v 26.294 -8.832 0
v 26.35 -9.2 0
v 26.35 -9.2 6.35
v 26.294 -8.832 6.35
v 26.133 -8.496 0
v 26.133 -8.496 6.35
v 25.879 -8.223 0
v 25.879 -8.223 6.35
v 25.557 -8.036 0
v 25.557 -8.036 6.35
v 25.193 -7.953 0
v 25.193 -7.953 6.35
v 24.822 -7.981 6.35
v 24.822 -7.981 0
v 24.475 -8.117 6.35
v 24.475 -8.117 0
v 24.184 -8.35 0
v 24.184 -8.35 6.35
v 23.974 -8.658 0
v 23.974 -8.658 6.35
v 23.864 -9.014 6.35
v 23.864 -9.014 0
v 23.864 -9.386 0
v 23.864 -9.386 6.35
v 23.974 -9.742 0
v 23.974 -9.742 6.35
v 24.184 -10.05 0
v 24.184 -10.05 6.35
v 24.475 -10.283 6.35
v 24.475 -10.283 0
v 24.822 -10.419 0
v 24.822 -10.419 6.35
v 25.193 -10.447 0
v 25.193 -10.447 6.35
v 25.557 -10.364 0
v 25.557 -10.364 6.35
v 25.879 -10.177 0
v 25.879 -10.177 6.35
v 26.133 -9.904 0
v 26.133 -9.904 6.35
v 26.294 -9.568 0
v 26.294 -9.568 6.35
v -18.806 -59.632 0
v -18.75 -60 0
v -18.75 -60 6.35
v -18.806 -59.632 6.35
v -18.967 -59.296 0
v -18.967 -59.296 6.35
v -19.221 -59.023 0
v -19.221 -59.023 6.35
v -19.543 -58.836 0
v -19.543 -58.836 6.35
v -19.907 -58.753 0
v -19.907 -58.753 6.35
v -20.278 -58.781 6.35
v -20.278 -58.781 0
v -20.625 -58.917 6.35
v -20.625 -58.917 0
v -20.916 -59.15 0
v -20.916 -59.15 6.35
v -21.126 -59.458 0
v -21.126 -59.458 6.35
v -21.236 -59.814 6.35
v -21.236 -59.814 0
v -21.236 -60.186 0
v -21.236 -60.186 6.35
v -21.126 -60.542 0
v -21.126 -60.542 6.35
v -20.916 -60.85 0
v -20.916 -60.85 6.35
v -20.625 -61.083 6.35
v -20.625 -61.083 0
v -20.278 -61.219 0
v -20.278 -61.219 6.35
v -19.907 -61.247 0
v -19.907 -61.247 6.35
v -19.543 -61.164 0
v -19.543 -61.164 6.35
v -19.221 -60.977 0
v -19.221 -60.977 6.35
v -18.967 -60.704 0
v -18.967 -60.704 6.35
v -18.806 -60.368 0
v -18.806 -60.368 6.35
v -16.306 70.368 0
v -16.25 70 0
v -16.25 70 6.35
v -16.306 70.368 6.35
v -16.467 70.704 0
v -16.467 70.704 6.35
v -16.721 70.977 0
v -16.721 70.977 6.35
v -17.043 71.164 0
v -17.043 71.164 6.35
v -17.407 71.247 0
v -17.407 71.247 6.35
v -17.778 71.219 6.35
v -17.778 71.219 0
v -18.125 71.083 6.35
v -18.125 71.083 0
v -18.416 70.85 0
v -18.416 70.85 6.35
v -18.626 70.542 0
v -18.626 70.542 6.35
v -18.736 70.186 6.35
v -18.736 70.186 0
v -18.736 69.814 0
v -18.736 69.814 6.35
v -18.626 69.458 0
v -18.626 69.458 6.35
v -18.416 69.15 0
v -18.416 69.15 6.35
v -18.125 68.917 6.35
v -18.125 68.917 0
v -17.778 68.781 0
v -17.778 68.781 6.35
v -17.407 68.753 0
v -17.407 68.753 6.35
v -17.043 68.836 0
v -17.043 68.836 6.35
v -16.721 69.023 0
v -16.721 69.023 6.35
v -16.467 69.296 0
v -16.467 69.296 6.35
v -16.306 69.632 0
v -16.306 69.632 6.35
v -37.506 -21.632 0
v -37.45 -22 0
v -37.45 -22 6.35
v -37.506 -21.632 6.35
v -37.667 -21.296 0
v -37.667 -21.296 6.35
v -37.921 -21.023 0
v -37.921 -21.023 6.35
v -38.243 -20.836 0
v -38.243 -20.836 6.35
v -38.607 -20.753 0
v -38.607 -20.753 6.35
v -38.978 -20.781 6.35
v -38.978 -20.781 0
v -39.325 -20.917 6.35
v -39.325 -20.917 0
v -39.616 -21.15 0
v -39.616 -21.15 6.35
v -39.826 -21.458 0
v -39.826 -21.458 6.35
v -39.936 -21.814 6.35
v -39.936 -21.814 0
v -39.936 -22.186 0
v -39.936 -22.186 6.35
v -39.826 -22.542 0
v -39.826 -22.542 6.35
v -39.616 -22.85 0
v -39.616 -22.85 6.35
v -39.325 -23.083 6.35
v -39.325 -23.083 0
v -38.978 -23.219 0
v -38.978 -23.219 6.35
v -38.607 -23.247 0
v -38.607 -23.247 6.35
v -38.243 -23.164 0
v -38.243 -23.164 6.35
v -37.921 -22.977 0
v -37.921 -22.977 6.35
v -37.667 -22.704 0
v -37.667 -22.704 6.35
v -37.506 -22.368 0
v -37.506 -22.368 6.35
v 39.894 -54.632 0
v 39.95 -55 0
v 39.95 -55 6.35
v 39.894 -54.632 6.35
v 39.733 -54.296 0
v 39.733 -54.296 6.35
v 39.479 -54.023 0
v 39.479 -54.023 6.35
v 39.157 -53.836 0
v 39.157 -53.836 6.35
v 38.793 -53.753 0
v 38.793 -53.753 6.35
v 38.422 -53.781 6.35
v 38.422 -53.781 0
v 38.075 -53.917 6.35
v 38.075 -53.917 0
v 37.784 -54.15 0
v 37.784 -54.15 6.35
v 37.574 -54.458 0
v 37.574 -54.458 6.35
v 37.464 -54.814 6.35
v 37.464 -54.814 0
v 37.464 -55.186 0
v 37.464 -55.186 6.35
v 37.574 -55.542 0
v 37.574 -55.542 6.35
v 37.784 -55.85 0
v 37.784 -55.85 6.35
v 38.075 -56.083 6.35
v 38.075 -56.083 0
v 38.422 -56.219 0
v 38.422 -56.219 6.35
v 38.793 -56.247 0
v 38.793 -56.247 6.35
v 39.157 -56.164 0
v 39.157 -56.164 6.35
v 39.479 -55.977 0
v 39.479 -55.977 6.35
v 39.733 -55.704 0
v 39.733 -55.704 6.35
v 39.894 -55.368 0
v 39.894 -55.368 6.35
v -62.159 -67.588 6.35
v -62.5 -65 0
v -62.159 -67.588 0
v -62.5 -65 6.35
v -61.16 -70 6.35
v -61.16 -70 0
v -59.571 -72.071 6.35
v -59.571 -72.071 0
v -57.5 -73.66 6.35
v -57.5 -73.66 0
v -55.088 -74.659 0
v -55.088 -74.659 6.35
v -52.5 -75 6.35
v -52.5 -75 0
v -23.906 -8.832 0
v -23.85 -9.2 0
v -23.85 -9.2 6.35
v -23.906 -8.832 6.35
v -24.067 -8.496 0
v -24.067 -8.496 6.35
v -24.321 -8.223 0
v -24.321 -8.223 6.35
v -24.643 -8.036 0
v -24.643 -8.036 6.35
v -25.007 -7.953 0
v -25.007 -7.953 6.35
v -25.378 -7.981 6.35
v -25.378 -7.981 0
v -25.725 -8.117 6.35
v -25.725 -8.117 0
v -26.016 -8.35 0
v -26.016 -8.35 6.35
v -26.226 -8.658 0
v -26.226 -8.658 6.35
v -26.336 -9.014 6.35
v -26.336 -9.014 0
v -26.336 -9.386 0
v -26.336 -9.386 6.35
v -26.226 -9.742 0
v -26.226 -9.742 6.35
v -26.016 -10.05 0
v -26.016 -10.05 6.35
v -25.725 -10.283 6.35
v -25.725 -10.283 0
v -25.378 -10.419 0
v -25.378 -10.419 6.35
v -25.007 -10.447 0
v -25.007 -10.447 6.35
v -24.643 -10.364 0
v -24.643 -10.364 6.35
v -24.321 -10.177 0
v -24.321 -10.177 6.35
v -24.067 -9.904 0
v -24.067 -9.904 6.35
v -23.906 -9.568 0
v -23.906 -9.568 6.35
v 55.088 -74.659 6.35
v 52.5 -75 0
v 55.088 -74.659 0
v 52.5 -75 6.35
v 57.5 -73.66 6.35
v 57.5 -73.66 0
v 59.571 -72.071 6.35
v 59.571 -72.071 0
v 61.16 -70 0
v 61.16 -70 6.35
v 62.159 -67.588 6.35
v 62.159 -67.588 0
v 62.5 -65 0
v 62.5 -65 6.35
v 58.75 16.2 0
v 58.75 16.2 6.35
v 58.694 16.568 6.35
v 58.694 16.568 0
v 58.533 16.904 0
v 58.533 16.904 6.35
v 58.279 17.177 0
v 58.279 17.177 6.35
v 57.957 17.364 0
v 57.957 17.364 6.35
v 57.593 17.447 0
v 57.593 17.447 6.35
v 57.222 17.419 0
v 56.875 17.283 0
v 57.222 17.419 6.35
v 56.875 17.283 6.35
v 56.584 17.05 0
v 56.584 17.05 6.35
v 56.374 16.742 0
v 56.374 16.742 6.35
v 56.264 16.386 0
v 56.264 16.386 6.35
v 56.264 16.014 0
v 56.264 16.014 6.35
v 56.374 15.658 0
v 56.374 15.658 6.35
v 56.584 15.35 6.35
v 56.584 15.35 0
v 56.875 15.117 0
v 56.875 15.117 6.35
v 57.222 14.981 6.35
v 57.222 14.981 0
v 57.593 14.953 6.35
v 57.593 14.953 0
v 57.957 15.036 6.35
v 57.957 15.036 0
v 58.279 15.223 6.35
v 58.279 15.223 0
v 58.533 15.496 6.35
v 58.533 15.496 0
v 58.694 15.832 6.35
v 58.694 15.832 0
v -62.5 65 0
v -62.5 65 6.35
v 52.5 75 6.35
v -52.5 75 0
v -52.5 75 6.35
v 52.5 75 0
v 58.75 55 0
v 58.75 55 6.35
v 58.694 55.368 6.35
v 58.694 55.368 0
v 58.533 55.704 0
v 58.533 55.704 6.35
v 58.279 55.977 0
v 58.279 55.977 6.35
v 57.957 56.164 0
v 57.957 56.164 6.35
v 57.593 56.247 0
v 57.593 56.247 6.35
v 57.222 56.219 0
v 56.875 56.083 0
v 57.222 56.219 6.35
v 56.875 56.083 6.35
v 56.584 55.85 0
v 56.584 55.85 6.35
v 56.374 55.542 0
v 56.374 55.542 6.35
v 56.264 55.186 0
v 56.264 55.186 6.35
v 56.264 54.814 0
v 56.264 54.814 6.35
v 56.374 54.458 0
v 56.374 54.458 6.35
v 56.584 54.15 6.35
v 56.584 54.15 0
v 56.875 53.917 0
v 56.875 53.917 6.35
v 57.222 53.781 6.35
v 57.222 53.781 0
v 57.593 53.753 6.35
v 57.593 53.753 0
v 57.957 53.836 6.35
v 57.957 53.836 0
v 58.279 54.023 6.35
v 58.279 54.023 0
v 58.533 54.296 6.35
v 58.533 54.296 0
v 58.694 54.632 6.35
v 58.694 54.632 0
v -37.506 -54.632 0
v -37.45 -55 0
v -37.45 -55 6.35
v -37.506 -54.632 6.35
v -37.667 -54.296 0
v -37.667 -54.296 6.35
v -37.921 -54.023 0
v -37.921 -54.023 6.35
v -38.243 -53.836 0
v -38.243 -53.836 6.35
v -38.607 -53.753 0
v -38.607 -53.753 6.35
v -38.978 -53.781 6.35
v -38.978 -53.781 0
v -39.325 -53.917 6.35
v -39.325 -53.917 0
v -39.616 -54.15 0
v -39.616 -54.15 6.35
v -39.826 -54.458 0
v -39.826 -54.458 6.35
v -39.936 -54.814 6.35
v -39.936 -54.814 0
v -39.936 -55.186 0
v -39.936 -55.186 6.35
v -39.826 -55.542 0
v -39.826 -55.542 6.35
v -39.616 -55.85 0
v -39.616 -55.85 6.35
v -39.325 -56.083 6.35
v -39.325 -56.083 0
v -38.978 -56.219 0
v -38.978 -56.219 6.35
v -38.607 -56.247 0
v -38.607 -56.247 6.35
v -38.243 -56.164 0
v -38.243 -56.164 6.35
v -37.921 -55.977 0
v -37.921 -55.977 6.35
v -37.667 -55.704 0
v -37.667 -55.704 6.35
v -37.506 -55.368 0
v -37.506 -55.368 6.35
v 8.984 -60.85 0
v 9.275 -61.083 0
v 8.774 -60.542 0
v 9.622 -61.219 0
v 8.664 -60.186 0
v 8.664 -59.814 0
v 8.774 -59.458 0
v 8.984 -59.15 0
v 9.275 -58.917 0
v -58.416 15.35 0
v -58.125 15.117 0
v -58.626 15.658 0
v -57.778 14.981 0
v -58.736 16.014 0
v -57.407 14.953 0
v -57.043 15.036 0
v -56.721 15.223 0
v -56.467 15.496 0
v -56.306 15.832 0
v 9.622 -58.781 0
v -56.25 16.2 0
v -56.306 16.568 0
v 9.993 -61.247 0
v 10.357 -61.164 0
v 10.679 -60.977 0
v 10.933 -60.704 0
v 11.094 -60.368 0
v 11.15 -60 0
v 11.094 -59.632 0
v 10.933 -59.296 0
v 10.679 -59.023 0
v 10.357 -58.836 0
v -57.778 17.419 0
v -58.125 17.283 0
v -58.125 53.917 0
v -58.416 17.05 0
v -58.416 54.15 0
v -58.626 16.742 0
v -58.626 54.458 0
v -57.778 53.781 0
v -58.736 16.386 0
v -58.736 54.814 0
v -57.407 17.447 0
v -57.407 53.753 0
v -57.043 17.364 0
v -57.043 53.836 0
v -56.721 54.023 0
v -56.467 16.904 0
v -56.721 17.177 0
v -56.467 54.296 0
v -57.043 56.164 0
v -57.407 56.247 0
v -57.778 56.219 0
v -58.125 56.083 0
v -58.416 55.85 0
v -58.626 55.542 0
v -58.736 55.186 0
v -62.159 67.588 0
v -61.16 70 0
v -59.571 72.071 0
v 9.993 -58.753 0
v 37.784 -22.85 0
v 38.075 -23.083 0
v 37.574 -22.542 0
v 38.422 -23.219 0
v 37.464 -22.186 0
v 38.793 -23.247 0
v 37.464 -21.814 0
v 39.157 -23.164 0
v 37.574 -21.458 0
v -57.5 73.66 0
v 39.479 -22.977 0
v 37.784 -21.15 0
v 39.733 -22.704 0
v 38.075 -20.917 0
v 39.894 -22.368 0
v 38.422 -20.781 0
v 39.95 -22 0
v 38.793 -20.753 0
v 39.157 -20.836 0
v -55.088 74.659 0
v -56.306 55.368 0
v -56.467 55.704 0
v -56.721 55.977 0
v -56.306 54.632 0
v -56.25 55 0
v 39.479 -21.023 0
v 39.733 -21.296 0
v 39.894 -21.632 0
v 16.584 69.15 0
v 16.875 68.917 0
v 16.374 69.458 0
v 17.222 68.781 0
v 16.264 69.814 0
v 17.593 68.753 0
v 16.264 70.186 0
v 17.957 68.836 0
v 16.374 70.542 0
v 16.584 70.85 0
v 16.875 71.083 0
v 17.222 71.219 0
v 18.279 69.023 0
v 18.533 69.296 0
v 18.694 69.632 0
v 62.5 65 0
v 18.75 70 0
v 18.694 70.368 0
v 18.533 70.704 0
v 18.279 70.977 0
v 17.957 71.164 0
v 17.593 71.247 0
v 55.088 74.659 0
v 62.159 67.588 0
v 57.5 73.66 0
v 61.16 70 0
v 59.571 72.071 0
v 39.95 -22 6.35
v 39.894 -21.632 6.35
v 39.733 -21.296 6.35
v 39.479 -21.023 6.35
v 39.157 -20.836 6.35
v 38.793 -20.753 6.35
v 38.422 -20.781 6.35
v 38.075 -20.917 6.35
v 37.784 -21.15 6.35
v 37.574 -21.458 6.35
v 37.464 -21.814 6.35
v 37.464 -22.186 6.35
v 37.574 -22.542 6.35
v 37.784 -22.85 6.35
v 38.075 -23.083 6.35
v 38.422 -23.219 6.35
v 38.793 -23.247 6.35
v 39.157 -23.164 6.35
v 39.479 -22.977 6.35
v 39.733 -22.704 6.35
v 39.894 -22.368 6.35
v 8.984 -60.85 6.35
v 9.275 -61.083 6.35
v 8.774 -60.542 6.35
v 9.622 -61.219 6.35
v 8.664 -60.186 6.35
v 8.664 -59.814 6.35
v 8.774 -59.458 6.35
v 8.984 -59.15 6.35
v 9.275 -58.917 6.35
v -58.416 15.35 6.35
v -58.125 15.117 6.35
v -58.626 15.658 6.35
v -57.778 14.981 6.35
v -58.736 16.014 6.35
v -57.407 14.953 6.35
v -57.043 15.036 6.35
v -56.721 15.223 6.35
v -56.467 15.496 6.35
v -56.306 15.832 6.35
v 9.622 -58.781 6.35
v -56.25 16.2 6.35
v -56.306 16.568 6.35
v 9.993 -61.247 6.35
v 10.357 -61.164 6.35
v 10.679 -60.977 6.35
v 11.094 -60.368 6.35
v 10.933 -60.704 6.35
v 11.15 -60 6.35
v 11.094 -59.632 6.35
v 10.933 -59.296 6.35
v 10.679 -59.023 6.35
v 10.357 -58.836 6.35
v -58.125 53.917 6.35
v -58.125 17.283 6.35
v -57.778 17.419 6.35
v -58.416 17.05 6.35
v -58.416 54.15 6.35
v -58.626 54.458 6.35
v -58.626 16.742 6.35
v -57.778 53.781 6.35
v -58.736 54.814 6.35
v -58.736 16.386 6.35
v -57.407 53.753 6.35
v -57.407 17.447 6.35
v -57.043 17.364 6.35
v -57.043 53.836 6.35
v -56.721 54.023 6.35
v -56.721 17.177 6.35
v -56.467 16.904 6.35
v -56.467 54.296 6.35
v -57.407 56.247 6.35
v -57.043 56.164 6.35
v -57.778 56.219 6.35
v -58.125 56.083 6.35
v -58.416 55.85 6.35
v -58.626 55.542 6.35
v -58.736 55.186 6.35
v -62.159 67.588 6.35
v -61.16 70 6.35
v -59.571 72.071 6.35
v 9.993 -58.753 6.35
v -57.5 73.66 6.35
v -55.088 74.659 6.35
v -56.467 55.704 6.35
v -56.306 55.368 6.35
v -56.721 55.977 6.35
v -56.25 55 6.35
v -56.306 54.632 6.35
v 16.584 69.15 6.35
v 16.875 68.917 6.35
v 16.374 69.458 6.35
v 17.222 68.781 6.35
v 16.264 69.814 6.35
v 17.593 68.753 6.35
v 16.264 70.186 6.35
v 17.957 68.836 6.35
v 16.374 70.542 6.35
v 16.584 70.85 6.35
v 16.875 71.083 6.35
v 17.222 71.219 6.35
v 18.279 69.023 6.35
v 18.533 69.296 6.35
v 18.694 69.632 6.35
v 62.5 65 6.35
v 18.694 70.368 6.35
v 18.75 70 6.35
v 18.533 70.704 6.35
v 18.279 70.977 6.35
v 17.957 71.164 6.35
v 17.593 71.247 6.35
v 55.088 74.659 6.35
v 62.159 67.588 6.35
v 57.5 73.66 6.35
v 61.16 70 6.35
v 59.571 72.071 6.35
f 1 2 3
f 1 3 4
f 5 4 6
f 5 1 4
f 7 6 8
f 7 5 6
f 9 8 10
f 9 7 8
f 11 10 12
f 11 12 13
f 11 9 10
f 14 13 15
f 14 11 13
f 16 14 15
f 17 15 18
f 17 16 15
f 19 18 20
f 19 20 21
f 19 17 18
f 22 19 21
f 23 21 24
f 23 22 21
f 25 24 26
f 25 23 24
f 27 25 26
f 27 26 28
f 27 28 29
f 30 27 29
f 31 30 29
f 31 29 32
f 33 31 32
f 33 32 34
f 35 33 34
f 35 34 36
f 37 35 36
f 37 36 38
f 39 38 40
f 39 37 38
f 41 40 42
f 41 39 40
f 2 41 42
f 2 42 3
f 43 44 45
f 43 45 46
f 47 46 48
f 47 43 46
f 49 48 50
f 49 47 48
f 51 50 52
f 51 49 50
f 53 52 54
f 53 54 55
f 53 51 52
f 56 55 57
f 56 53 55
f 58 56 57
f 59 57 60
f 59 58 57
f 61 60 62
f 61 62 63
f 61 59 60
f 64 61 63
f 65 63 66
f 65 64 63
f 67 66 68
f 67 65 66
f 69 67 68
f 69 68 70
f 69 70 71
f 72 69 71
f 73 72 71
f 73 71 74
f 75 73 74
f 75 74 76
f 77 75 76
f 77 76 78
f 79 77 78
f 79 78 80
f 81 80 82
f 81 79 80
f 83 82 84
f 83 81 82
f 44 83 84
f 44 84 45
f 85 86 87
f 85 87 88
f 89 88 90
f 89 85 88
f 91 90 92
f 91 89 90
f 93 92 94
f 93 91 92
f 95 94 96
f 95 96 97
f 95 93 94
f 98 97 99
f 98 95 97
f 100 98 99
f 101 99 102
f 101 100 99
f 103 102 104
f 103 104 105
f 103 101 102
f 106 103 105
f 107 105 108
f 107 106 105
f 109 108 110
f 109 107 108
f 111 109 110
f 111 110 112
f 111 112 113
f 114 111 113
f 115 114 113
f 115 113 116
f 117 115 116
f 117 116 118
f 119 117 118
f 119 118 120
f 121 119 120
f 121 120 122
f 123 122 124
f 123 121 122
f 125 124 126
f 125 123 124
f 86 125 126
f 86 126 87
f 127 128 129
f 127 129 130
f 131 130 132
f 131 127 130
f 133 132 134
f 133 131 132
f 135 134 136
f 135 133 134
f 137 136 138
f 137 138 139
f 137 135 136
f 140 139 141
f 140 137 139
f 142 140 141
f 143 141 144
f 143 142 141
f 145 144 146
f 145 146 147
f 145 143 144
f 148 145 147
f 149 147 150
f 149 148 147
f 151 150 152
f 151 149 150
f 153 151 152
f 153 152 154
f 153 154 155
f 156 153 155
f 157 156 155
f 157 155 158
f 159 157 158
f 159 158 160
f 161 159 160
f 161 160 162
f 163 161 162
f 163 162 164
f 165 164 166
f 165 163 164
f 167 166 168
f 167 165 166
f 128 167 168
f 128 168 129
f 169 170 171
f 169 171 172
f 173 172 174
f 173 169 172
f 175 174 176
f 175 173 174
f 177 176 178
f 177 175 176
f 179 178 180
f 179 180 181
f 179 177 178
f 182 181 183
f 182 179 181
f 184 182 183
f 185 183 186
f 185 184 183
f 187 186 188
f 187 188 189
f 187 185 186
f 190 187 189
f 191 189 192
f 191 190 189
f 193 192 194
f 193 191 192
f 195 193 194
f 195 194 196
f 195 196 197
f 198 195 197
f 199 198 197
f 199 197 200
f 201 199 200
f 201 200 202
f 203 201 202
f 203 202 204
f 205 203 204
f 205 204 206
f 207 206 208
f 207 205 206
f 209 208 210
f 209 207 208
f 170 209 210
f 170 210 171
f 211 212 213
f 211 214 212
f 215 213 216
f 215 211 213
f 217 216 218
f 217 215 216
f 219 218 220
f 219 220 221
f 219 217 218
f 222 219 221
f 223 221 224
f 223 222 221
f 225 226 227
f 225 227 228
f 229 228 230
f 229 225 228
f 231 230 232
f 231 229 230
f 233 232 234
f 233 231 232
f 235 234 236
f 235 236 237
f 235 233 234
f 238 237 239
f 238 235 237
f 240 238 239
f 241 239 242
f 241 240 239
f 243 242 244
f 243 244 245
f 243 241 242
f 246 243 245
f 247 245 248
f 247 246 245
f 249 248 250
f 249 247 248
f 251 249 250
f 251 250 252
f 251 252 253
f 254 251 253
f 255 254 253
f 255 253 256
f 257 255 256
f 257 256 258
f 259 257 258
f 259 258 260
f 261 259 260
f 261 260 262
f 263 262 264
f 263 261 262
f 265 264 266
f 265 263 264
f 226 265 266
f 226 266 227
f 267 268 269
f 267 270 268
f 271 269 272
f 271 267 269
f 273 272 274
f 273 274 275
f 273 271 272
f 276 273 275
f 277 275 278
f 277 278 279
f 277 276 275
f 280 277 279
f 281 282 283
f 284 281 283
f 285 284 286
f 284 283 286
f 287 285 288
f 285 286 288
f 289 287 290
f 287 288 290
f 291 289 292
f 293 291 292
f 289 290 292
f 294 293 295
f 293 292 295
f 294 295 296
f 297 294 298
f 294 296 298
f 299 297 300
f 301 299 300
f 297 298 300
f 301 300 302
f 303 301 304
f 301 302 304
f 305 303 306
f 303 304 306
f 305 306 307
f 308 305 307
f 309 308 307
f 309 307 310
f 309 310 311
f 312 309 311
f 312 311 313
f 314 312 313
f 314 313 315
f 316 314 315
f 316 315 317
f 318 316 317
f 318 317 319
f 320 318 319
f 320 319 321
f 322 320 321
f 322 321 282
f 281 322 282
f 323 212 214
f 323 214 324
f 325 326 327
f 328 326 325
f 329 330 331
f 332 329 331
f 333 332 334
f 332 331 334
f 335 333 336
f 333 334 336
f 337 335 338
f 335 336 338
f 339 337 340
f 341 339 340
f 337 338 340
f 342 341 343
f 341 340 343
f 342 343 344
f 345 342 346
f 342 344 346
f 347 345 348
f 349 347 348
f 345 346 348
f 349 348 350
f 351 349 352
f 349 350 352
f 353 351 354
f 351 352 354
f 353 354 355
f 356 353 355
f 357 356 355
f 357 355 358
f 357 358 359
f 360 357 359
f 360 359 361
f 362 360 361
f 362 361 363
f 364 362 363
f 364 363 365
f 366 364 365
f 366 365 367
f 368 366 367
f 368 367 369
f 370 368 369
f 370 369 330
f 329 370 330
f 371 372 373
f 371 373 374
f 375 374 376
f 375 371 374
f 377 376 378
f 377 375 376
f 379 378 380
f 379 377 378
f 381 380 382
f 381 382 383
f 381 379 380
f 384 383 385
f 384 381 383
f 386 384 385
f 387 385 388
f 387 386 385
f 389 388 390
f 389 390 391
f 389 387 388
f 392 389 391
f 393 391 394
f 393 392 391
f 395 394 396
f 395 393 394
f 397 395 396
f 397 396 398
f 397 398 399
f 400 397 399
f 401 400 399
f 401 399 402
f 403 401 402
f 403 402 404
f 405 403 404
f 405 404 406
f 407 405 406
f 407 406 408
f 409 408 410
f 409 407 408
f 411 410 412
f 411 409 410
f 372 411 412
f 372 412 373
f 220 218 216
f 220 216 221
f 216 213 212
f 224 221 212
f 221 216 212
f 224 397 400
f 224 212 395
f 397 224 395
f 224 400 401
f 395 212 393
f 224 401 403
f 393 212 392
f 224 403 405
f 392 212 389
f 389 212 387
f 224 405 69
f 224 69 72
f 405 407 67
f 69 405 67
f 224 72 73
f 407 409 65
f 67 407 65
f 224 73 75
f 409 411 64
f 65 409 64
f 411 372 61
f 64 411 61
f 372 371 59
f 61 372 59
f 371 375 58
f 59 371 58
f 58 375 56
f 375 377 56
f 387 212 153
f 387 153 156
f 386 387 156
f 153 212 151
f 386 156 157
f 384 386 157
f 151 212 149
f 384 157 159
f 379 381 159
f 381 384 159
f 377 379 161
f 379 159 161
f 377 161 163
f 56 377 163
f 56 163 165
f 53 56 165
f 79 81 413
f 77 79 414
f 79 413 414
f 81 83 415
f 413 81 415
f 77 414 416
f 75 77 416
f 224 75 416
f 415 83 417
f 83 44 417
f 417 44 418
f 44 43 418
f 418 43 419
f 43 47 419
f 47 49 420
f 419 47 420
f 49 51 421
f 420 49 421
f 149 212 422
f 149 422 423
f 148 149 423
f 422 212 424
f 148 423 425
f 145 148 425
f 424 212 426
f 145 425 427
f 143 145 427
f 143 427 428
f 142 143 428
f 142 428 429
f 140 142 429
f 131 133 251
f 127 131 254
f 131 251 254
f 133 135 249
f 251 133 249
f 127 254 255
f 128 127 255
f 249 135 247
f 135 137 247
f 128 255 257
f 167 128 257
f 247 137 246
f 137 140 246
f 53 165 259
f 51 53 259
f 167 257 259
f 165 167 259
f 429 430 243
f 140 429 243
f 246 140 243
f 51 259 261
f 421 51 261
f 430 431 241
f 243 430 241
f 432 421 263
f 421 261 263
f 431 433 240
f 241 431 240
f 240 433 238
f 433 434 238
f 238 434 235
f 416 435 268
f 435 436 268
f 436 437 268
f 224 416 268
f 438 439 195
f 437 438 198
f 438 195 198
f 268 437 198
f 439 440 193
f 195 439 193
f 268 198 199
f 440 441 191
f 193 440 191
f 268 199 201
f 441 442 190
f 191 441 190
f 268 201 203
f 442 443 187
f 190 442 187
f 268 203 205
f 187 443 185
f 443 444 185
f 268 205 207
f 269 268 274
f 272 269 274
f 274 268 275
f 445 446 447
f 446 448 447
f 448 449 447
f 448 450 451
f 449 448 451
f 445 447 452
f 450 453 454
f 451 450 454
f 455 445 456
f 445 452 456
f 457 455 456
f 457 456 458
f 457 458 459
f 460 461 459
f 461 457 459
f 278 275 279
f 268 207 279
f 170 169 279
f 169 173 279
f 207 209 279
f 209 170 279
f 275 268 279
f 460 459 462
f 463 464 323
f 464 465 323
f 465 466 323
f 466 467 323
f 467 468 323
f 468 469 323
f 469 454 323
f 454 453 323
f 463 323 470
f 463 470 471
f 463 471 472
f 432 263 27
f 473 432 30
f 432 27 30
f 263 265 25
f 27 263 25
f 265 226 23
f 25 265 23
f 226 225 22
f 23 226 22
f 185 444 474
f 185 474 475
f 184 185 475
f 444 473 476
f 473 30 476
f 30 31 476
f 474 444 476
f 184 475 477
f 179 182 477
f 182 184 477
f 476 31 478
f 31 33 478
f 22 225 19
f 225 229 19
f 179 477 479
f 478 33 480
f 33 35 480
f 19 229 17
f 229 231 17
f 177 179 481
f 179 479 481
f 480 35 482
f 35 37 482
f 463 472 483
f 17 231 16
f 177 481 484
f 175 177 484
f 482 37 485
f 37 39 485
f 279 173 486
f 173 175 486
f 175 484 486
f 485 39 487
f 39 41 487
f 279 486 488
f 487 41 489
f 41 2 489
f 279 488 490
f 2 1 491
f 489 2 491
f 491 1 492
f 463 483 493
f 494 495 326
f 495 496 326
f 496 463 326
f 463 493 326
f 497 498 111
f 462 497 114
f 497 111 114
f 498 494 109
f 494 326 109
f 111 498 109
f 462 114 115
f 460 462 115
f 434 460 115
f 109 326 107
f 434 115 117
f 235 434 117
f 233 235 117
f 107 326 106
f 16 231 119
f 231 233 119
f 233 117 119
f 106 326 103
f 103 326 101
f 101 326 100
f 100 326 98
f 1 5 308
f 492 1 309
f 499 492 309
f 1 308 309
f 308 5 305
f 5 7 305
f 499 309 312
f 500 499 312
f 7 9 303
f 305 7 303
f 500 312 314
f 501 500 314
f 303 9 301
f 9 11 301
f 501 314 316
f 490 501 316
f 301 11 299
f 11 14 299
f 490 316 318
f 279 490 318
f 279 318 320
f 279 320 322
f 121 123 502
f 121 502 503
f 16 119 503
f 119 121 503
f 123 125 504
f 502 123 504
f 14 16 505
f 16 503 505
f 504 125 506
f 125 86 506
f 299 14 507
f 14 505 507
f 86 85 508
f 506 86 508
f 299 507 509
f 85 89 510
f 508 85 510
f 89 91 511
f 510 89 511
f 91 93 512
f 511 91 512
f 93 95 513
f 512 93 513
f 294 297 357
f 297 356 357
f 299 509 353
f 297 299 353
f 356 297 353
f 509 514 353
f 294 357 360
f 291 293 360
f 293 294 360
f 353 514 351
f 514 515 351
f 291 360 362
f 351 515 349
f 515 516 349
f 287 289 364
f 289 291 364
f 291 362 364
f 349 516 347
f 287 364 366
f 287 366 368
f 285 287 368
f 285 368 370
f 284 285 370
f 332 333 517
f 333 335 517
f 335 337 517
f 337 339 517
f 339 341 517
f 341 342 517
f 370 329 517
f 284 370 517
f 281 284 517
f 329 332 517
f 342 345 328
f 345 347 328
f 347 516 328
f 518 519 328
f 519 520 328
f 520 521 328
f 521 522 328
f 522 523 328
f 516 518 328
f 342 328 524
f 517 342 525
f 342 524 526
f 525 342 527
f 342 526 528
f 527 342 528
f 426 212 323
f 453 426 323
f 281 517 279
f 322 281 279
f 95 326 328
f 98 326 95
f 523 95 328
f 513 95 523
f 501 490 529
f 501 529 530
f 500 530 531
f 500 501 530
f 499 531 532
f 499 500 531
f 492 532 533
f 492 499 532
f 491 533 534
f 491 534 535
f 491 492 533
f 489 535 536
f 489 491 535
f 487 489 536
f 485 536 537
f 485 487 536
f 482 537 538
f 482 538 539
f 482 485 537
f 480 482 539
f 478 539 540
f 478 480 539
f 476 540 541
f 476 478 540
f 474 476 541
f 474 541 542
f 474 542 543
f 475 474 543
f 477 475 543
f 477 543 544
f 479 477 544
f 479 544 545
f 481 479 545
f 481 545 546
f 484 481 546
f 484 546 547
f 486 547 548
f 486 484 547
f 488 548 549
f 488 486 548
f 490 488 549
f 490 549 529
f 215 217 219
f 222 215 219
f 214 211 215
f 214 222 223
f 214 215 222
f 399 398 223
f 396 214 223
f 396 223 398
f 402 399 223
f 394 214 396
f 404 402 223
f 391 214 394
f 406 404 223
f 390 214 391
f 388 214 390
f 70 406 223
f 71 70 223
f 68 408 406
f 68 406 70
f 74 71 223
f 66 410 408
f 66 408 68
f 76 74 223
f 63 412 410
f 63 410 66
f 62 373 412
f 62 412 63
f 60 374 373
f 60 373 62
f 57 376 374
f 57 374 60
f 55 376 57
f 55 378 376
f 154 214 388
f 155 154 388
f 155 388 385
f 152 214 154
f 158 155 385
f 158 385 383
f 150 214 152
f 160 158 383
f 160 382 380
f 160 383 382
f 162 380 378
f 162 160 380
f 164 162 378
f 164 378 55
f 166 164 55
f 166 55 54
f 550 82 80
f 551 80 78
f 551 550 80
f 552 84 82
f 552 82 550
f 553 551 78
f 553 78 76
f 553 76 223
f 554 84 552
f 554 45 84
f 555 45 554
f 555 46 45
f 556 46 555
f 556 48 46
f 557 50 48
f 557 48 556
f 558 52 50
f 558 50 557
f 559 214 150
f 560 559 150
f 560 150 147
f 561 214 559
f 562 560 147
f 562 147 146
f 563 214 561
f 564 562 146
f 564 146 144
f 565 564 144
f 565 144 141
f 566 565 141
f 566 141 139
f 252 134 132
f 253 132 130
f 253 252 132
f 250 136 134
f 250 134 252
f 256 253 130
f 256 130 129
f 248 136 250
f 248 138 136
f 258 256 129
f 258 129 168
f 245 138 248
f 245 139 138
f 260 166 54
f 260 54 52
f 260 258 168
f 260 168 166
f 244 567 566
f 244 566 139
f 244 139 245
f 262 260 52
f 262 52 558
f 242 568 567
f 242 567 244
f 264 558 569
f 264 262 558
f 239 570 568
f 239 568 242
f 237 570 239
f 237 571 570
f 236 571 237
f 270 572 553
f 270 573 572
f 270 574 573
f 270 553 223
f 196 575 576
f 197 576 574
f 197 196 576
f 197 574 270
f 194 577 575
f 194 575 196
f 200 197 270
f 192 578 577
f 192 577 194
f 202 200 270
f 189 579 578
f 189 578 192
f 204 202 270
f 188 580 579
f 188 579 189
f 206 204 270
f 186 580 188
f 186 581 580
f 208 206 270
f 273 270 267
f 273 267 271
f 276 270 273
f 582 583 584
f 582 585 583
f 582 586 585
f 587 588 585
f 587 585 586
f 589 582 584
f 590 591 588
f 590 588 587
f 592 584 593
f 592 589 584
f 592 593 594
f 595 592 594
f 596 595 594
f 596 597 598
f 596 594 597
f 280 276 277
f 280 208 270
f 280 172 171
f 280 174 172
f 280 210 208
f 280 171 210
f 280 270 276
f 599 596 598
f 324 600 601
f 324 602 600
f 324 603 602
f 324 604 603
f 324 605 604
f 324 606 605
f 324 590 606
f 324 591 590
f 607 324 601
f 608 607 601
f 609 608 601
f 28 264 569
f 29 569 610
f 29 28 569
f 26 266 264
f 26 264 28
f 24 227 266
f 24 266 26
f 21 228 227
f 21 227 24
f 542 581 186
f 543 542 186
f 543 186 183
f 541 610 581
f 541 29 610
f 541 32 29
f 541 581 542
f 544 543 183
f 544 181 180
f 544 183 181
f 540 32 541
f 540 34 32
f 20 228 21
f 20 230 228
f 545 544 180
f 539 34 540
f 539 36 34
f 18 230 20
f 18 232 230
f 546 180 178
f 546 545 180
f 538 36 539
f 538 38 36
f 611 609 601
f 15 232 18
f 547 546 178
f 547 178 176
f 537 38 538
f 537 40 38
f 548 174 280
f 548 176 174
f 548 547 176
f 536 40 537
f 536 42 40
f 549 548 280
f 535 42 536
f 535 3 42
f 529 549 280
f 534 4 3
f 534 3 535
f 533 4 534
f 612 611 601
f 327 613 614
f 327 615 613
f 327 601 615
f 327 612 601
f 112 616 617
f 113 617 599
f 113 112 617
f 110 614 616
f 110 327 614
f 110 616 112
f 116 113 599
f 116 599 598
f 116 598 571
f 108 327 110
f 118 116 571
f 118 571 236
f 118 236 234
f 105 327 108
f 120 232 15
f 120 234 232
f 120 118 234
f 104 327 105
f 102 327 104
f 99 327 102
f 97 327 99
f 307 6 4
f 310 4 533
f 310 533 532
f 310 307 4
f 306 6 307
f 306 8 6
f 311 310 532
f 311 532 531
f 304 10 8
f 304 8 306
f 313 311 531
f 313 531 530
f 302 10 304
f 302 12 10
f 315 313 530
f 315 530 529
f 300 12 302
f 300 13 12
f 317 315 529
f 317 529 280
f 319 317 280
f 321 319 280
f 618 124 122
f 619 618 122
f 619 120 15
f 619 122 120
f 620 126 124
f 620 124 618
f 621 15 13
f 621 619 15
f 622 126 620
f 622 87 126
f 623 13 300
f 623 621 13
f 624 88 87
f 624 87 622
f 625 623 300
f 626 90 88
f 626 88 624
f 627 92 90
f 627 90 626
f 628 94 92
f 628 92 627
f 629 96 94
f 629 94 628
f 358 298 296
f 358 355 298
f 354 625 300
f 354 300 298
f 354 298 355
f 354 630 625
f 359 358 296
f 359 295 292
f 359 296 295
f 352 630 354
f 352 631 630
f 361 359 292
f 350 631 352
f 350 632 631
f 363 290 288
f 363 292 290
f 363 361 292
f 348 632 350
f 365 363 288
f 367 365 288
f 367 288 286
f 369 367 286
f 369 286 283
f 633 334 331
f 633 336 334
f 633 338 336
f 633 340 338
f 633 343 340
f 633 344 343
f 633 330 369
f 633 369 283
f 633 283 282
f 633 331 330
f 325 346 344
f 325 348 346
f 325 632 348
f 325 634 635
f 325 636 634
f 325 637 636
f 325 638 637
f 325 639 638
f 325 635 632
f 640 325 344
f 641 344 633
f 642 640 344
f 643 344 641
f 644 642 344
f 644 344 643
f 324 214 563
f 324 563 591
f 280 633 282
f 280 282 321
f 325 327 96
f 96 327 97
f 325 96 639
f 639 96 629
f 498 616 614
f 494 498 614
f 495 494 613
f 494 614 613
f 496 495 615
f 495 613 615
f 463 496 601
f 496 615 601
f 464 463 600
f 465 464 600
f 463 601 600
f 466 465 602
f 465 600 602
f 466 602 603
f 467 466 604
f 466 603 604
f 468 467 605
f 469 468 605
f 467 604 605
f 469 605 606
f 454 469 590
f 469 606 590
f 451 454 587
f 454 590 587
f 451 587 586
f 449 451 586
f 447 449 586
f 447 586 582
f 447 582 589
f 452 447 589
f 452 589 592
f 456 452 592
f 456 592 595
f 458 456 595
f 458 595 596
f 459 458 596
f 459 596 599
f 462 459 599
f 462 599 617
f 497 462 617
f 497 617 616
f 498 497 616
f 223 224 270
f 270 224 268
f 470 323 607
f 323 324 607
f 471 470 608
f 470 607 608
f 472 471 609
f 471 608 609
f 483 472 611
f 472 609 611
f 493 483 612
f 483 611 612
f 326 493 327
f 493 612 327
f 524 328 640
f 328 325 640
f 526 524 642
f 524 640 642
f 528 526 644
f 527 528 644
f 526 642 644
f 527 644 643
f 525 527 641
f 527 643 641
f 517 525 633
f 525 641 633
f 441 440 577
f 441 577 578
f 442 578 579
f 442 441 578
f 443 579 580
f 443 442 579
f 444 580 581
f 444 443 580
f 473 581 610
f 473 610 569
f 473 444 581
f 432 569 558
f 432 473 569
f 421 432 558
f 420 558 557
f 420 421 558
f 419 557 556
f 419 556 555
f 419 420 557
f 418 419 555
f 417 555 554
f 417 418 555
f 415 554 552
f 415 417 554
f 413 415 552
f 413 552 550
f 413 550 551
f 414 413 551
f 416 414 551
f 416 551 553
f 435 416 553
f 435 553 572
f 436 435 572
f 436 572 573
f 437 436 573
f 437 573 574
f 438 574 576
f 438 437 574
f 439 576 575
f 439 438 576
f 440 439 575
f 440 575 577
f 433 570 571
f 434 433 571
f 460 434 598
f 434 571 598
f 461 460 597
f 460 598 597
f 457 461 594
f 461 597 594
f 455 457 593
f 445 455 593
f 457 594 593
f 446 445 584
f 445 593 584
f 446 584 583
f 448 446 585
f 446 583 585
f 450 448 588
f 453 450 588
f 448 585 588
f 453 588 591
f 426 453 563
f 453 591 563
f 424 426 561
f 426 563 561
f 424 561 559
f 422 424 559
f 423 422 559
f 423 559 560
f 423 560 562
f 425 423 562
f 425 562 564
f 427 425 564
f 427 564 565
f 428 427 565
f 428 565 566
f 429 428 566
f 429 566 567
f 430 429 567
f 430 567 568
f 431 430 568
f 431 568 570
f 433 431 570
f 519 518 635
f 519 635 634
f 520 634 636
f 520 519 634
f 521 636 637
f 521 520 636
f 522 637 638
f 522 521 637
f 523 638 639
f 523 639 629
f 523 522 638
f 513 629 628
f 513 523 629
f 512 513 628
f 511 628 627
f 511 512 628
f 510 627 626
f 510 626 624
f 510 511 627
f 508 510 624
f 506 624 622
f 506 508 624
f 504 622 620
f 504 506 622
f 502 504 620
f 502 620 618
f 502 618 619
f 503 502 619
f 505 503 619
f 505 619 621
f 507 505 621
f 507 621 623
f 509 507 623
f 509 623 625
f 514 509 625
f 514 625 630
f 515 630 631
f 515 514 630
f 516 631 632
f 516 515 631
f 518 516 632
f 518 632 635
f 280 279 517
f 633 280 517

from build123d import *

# Parameters (mm, degrees)
SKETCH1_W           = 125
SKETCH1_H           = 150
SKETCH1_R           = 1.25
BOSS_EXTRUDE1_DEPTH = 6.35
FILLET1_R           = 10
CUT_EXTRUDE1_REACH  = 8.35
SKETCH2_R           = 1.25


with BuildPart() as part:
    # Sketch1 → Boss-Extrude1 (new body)
    with BuildSketch(Plane.XY):
        Rectangle(SKETCH1_W, SKETCH1_H)
        with Locations((-25.1, -9.2)):
            Circle(SKETCH1_R, mode=Mode.SUBTRACT)
        with Locations((25.1, -9.2)):
            Circle(SKETCH1_R, mode=Mode.SUBTRACT)
        with Locations((-20, -60)):
            Circle(SKETCH1_R, mode=Mode.SUBTRACT)
        with Locations((9.9, -60)):
            Circle(SKETCH1_R, mode=Mode.SUBTRACT)
        with Locations((-17.5, 70)):
            Circle(SKETCH1_R, mode=Mode.SUBTRACT)
        with Locations((17.5, 70)):
            Circle(SKETCH1_R, mode=Mode.SUBTRACT)
        with Locations((38.7, -55)):
            Circle(SKETCH1_R, mode=Mode.SUBTRACT)
        with Locations((38.7, -22)):
            Circle(SKETCH1_R, mode=Mode.SUBTRACT)
        with Locations((-38.7, -22)):
            Circle(SKETCH1_R, mode=Mode.SUBTRACT)
        with Locations((-38.7, -55)):
            Circle(SKETCH1_R, mode=Mode.SUBTRACT)
    extrude(amount=BOSS_EXTRUDE1_DEPTH)

    # Fillet1
    fillet1_edges = [part.edges().sort_by_distance(p)[0] for p in [
        (62.5, -75, 3.175),
        (-62.5, -75, 3.175),
        (-62.5, 75, 3.175),
        (62.5, 75, 3.175),
    ]]
    fillet(fillet1_edges, radius=FILLET1_R)

    # Sketch2 → Cut-Extrude1 (cut, up to next)
    with BuildSketch(Plane.XY.offset(6.35), mode=Mode.PRIVATE) as cut_extrude1_sk1:
        with Locations((57.5, 55)):
            Circle(SKETCH2_R)
    cut_extrude1_tool1 = extrude(cut_extrude1_sk1.sketch, amount=-CUT_EXTRUDE1_REACH, mode=Mode.PRIVATE) & part.part
    add(cut_extrude1_tool1.solids().sort_by_distance((57.5, 55, 6.35))[0], mode=Mode.SUBTRACT)
    # Sketch2 → Cut-Extrude1 (cut, up to next)
    with BuildSketch(Plane.XY.offset(6.35), mode=Mode.PRIVATE) as cut_extrude1_sk2:
        with Locations((57.5, 16.2)):
            Circle(SKETCH2_R)
    cut_extrude1_tool2 = extrude(cut_extrude1_sk2.sketch, amount=-CUT_EXTRUDE1_REACH, mode=Mode.PRIVATE) & part.part
    add(cut_extrude1_tool2.solids().sort_by_distance((57.5, 16.2, 6.35))[0], mode=Mode.SUBTRACT)
    # Sketch2 → Cut-Extrude1 (cut, up to next)
    with BuildSketch(Plane.XY.offset(6.35), mode=Mode.PRIVATE) as cut_extrude1_sk3:
        with Locations((-57.5, 16.2)):
            Circle(SKETCH2_R)
    cut_extrude1_tool3 = extrude(cut_extrude1_sk3.sketch, amount=-CUT_EXTRUDE1_REACH, mode=Mode.PRIVATE) & part.part
    add(cut_extrude1_tool3.solids().sort_by_distance((-57.5, 16.2, 6.35))[0], mode=Mode.SUBTRACT)
    # Sketch2 → Cut-Extrude1 (cut, up to next)
    with BuildSketch(Plane.XY.offset(6.35), mode=Mode.PRIVATE) as cut_extrude1_sk4:
        with Locations((-57.5, 55)):
            Circle(SKETCH2_R)
    cut_extrude1_tool4 = extrude(cut_extrude1_sk4.sketch, amount=-CUT_EXTRUDE1_REACH, mode=Mode.PRIVATE) & part.part
    add(cut_extrude1_tool4.solids().sort_by_distance((-57.5, 55, 6.35))[0], mode=Mode.SUBTRACT)


solid = part.part
